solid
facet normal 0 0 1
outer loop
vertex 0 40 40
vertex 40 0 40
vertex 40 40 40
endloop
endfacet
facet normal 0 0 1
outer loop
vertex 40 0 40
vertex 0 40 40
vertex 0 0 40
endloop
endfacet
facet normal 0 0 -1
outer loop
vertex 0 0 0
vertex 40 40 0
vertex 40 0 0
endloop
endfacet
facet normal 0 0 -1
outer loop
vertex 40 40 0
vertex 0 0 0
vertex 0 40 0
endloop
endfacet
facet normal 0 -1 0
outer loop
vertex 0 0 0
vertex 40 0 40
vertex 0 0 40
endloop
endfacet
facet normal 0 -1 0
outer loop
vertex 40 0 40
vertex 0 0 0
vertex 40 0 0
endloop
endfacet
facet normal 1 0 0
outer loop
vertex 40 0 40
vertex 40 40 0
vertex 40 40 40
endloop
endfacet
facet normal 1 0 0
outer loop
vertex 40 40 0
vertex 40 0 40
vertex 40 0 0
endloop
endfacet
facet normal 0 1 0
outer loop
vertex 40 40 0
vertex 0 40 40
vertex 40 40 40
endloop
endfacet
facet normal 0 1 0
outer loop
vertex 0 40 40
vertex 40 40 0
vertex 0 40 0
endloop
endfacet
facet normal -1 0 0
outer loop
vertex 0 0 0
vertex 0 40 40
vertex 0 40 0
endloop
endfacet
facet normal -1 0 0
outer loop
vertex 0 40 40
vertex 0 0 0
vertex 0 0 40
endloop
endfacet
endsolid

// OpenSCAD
$fn=48;
cube([40,40,40]);                      // intended slot is absent
